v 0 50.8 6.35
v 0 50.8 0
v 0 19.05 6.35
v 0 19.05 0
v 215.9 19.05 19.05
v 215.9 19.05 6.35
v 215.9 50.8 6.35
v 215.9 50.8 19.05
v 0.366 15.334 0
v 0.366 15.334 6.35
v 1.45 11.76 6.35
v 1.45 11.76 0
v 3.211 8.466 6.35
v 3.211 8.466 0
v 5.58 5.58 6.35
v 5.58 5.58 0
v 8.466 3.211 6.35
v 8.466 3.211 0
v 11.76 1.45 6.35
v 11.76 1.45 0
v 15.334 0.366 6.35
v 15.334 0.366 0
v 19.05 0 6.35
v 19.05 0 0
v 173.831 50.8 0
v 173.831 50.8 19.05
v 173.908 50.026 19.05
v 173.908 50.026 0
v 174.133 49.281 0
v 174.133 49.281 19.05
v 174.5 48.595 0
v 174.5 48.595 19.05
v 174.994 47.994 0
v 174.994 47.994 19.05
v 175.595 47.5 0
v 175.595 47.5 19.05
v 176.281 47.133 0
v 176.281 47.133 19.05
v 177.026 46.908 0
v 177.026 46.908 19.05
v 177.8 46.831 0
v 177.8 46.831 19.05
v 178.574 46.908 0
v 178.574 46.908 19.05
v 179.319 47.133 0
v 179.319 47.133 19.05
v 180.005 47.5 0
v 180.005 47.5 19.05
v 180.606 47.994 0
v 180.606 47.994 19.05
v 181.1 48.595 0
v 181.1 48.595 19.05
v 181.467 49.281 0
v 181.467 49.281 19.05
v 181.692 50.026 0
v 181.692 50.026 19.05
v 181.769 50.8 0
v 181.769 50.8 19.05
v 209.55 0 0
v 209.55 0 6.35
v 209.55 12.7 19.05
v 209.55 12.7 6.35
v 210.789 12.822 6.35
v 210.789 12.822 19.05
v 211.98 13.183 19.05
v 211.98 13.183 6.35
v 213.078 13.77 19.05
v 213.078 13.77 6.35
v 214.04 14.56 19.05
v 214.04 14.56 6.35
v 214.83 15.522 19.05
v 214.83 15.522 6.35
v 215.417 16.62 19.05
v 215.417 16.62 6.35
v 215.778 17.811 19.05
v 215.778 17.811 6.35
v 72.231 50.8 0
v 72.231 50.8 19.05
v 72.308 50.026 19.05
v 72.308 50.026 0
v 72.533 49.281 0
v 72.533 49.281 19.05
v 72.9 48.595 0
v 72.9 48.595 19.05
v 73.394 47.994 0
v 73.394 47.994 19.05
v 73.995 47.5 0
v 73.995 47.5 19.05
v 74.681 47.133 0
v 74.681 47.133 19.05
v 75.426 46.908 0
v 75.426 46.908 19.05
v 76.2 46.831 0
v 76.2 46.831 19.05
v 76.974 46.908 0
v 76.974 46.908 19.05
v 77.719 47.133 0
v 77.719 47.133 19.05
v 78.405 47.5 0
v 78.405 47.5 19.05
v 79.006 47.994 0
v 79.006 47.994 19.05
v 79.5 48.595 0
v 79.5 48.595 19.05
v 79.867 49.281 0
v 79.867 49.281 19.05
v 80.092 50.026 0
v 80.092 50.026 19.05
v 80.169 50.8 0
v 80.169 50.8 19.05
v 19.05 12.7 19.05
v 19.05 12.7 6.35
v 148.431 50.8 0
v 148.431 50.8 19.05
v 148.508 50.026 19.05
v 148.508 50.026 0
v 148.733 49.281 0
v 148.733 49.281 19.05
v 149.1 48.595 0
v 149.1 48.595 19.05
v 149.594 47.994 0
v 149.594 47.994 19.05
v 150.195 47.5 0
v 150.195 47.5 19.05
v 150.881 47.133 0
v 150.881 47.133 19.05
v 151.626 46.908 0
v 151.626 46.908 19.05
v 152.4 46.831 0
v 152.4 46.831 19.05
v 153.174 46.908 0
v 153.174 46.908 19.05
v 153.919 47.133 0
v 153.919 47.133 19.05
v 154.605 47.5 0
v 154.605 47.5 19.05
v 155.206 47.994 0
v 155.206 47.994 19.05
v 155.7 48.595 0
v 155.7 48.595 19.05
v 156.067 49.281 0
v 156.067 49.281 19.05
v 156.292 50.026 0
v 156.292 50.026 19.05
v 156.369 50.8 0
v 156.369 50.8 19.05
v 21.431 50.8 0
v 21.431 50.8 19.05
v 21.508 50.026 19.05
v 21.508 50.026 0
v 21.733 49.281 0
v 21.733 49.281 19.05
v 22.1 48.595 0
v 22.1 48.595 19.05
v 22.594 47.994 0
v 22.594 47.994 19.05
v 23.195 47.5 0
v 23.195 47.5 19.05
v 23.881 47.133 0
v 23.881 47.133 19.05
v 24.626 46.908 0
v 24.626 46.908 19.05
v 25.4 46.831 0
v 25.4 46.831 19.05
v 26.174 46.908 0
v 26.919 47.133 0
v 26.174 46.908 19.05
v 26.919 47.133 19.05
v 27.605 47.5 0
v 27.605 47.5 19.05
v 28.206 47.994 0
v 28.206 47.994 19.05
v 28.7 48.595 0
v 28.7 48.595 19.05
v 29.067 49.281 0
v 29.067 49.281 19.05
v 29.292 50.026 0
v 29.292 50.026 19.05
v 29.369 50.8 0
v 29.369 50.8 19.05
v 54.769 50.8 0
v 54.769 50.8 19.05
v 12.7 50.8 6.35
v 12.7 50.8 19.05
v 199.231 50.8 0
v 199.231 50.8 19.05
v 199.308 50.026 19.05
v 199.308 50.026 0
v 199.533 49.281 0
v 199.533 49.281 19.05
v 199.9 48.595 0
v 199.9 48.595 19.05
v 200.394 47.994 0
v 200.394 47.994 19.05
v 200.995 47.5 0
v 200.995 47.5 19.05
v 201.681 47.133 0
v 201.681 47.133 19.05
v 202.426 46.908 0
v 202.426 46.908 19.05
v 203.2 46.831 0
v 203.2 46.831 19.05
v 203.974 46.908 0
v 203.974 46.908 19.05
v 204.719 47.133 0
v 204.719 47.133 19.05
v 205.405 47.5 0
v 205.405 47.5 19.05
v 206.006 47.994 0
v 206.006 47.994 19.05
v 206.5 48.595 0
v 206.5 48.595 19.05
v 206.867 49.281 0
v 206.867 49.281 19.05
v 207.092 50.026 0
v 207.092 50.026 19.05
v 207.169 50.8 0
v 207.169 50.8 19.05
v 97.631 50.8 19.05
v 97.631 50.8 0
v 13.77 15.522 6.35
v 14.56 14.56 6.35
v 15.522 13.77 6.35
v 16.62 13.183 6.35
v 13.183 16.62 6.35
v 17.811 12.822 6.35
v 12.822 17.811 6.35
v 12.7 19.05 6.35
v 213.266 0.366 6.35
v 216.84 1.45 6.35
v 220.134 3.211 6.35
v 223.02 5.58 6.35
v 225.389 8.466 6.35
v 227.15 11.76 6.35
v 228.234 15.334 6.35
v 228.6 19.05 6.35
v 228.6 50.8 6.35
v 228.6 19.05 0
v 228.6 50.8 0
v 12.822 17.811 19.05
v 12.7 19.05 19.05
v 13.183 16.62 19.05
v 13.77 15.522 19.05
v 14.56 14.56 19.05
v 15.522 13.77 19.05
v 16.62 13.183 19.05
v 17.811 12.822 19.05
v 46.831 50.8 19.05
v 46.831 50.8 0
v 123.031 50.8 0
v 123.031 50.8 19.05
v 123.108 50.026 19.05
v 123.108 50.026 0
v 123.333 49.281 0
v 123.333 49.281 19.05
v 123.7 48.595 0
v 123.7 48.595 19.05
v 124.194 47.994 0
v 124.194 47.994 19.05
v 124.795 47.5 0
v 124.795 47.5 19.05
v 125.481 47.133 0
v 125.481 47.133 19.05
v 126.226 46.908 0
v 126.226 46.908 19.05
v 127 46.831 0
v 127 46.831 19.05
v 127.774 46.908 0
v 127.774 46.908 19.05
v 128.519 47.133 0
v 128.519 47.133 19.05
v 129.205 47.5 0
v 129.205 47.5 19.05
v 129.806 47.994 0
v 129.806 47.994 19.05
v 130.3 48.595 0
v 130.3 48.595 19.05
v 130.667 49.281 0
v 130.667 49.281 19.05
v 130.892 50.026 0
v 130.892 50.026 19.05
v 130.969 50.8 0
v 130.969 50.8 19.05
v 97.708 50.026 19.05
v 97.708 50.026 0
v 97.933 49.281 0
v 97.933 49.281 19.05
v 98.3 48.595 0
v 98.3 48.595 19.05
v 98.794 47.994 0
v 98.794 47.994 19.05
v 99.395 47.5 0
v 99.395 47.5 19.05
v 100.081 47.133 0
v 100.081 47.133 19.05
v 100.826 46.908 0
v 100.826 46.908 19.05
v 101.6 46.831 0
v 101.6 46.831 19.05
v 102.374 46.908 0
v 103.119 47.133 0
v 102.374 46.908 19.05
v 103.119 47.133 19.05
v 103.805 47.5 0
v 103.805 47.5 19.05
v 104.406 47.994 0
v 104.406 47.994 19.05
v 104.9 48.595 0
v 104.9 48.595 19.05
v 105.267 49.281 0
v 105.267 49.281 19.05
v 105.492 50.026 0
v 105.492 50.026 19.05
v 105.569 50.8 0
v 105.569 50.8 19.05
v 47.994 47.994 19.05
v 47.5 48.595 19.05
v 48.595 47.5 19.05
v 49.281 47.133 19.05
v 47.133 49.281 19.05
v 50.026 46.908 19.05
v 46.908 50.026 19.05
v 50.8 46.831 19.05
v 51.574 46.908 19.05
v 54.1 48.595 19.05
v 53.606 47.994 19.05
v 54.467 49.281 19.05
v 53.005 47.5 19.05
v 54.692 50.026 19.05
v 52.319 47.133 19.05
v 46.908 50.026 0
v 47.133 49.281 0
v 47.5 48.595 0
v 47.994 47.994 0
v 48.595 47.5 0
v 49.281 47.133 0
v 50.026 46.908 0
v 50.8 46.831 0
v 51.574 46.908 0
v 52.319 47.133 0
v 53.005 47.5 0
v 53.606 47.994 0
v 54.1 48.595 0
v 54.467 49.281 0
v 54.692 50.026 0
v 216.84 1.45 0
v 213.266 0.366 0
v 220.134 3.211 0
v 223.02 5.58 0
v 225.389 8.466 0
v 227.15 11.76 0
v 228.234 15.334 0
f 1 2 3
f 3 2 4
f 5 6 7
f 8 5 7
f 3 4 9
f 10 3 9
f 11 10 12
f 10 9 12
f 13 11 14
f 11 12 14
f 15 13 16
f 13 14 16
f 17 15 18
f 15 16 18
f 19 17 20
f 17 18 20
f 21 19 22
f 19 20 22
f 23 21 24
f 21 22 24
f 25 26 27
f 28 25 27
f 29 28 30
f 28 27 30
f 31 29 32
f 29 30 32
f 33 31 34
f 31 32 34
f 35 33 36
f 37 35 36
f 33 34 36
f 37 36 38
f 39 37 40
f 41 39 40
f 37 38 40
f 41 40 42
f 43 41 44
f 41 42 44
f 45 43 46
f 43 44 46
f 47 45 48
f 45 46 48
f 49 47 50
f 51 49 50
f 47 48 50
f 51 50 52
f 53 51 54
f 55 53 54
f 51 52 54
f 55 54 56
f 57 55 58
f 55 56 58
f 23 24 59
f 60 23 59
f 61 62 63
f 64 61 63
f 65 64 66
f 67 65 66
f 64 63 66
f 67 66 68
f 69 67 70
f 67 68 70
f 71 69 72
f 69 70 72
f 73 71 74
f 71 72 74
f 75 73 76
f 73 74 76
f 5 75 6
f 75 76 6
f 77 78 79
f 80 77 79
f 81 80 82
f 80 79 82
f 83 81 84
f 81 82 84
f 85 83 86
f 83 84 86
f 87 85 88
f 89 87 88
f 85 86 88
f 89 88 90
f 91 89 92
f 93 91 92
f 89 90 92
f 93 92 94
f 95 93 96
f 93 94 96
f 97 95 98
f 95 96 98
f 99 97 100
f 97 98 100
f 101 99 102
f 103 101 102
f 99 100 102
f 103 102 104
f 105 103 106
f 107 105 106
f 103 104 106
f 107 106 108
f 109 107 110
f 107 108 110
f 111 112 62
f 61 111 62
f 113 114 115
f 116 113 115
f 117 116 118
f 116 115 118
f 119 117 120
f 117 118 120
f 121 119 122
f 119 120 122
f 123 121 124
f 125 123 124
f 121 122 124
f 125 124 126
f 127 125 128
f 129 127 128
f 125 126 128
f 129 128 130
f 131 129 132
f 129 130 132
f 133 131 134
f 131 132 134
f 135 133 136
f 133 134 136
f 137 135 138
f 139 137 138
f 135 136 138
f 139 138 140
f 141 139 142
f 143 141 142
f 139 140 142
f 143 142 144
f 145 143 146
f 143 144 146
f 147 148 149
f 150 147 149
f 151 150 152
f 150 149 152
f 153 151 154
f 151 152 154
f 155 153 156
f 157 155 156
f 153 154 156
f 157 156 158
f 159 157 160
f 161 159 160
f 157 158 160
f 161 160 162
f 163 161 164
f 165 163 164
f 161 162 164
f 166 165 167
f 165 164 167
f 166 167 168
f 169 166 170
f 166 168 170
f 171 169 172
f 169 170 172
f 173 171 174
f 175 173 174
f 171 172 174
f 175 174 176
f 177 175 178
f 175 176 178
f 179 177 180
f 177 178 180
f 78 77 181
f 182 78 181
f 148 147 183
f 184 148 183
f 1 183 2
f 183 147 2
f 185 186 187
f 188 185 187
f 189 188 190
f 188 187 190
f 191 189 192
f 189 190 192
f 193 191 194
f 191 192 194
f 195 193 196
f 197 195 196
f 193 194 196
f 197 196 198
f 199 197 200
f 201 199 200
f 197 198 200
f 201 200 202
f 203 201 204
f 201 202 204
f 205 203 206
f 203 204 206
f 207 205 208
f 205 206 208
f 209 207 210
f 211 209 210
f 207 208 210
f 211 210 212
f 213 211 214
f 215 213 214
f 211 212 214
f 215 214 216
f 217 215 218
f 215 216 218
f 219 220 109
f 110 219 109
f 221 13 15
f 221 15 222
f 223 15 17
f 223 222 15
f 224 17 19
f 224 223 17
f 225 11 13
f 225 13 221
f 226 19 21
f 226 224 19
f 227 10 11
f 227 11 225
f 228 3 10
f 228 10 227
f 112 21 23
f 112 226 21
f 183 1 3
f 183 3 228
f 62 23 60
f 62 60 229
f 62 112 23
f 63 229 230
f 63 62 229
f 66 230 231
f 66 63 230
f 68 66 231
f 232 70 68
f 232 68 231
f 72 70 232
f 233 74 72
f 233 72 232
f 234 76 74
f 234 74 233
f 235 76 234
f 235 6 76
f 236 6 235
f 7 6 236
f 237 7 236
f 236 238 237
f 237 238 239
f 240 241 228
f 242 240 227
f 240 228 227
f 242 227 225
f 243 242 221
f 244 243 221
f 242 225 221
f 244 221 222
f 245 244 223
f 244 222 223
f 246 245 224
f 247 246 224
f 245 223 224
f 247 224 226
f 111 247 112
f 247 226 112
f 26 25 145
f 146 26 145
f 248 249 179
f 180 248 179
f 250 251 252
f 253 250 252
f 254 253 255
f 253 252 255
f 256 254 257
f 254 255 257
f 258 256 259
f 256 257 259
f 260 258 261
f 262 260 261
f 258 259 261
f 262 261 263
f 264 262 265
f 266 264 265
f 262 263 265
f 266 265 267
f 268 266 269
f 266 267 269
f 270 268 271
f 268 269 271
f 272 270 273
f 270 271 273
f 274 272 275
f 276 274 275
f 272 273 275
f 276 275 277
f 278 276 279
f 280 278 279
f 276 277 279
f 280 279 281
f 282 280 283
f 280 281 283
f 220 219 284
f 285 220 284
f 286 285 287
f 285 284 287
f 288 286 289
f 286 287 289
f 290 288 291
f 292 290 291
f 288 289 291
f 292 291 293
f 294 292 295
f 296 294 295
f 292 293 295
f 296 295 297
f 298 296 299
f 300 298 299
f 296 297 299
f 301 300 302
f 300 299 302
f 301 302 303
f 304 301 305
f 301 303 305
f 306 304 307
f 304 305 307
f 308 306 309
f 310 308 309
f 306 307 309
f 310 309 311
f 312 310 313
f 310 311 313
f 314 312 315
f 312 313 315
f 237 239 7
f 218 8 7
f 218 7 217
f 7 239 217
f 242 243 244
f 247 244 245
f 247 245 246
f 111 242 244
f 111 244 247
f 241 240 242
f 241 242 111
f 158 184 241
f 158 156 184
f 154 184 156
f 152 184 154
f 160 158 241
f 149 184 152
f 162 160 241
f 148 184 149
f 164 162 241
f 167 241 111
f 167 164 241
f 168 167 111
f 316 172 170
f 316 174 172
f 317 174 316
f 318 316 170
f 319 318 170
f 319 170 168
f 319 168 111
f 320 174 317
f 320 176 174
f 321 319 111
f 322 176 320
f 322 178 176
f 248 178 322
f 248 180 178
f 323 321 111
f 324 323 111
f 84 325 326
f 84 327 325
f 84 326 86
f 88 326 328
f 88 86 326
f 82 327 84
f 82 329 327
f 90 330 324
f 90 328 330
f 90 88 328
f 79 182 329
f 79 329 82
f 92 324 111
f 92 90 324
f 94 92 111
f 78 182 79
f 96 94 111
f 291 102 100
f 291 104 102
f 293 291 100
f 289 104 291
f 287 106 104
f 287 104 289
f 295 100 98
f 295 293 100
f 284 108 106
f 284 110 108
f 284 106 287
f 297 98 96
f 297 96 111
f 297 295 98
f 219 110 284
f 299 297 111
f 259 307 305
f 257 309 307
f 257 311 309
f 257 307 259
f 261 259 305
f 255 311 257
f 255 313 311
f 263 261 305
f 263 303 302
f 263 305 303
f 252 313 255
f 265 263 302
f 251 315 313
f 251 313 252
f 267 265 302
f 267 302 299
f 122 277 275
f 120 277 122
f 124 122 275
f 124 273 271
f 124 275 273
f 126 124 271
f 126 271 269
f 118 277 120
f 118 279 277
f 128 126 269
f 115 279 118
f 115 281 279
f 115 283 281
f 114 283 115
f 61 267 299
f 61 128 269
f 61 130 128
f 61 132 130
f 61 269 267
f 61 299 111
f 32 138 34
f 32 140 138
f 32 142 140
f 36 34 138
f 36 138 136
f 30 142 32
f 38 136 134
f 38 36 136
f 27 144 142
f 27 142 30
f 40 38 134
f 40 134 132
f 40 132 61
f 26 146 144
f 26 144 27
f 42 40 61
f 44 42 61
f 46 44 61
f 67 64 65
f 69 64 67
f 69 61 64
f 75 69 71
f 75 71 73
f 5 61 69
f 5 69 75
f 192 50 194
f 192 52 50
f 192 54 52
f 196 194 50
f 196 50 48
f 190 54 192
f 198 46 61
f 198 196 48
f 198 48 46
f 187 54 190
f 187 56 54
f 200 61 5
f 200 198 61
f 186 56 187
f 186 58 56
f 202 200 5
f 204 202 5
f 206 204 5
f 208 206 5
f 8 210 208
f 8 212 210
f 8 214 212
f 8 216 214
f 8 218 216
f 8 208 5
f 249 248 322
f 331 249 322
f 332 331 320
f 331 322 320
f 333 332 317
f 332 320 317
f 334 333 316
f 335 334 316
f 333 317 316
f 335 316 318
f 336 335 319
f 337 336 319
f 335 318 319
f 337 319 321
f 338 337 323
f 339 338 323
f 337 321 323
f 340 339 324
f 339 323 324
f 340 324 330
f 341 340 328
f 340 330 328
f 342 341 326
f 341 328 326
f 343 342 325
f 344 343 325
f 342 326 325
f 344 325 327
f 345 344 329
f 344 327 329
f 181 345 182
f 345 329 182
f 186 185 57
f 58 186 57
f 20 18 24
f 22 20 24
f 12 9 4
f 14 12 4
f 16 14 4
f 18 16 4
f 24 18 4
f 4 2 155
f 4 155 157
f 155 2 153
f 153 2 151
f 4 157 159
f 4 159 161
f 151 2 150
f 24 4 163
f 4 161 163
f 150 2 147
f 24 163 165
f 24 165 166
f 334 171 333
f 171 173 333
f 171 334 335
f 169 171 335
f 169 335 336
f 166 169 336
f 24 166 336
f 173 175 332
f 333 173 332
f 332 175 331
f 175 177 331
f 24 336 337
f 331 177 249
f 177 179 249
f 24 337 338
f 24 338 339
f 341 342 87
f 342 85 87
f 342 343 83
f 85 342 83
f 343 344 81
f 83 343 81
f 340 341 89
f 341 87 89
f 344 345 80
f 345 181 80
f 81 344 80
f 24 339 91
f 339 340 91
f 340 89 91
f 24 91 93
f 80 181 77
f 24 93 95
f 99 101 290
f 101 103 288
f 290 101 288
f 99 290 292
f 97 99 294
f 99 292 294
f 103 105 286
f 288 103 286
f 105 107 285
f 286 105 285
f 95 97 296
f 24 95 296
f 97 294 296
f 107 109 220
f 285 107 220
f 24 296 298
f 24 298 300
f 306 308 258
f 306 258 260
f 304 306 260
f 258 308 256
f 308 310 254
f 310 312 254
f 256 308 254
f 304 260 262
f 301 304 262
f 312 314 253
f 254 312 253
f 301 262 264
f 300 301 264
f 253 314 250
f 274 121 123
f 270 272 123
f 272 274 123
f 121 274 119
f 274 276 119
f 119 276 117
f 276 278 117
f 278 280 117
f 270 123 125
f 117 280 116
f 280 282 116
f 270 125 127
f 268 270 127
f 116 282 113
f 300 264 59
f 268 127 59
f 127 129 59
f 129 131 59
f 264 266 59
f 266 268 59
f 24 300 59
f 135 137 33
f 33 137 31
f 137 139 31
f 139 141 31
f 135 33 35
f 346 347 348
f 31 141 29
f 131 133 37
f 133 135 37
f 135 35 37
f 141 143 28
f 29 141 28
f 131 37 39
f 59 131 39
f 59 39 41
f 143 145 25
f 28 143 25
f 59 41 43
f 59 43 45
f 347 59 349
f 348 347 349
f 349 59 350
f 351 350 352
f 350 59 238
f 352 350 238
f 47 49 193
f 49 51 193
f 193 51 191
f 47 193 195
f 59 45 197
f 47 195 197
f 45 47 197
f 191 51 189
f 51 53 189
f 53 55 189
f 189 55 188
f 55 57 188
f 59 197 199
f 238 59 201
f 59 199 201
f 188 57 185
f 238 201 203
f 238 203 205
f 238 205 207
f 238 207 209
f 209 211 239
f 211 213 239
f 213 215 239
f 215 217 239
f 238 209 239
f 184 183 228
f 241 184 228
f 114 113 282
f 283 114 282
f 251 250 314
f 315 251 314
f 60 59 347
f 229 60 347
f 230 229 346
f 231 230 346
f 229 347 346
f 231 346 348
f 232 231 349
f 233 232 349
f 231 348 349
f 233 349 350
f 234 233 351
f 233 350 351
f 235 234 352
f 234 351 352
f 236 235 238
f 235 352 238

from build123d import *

# Parameters (mm, degrees)
F1_DEPTH = 6.35
F3_DEPTH = 12.7
F5_DEPTH = 25.4


with BuildPart() as f1:
    # F0 (on Top) → F1 (new body)
    with BuildSketch(Plane.XY):
        with BuildLine():
            ThreePointArc((0, 19.05), (5.579616, 5.579616), (19.05, 0))
            Line((19.05, 0), (209.55, 0))
            ThreePointArc((209.55, 0), (223.020384, 5.579616), (228.6, 19.05))
            Line((228.6, 19.05), (228.6, 50.8))
            Line((228.6, 50.8), (0, 50.8))
            Line((0, 50.8), (0, 19.05))
        make_face()
    extrude(amount=F1_DEPTH)

    # F2 (on face) → F3 (join)
    with BuildSketch(Plane.XY.offset(6.35)):
        with BuildLine():
            Line((12.7, 50.8), (12.7, 19.05))
            ThreePointArc((12.7, 19.05), (14.559872, 14.559872), (19.05, 12.7))
            Line((19.05, 12.7), (209.55, 12.7))
            ThreePointArc((209.55, 12.7), (214.040128, 14.559872), (215.9, 19.05))
            Line((215.9, 19.05), (215.9, 50.8))
            Line((215.9, 50.8), (12.7, 50.8))
        make_face()
    extrude(amount=F3_DEPTH)

    # F4 (on face) → F5 (cut)
    with BuildSketch(Plane.XY.offset(19.05)):
        with BuildLine():
            ThreePointArc((29.36875, 50.8), (25.4, 54.76875), (21.43125, 50.8))
            Line((21.43125, 50.8), (29.36875, 50.8))
        make_face()
        with BuildLine():
            Line((29.36875, 50.8), (21.43125, 50.8))
            ThreePointArc((21.43125, 50.8), (25.4, 46.83125), (29.36875, 50.8))
        make_face()
        with BuildLine():
            ThreePointArc((54.76875, 50.8), (50.8, 54.76875), (46.83125, 50.8))
            Line((46.83125, 50.8), (54.76875, 50.8))
        make_face()
        with BuildLine():
            Line((54.76875, 50.8), (46.83125, 50.8))
            ThreePointArc((46.83125, 50.8), (50.8, 46.83125), (54.76875, 50.8))
        make_face()
        with BuildLine():
            ThreePointArc((72.23125, 50.8), (76.2, 46.83125), (80.16875, 50.8))
            Line((80.16875, 50.8), (72.23125, 50.8))
        make_face()
        with BuildLine():
            ThreePointArc((199.23125, 50.8), (203.2, 46.83125), (207.16875, 50.8))
            Line((207.16875, 50.8), (199.23125, 50.8))
        make_face()
        with BuildLine():
            ThreePointArc((173.83125, 50.8), (177.8, 46.83125), (181.76875, 50.8))
            Line((181.76875, 50.8), (173.83125, 50.8))
        make_face()
        with BuildLine():
            ThreePointArc((148.43125, 50.8), (152.4, 46.83125), (156.36875, 50.8))
            Line((156.36875, 50.8), (148.43125, 50.8))
        make_face()
        with BuildLine():
            ThreePointArc((123.03125, 50.8), (127, 46.83125), (130.96875, 50.8))
            Line((130.96875, 50.8), (123.03125, 50.8))
        make_face()
        with BuildLine():
            Line((97.63125, 50.8), (105.56875, 50.8))
            ThreePointArc((105.56875, 50.8), (101.6, 54.76875), (97.63125, 50.8))
        make_face()
        with BuildLine():
            Line((72.23125, 50.8), (80.16875, 50.8))
            ThreePointArc((80.16875, 50.8), (76.2, 54.76875), (72.23125, 50.8))
        make_face()
        with BuildLine():
            Line((199.23125, 50.8), (207.16875, 50.8))
            ThreePointArc((207.16875, 50.8), (203.2, 54.76875), (199.23125, 50.8))
        make_face()
        with BuildLine():
            Line((173.83125, 50.8), (181.76875, 50.8))
            ThreePointArc((181.76875, 50.8), (177.8, 54.76875), (173.83125, 50.8))
        make_face()
        with BuildLine():
            Line((148.43125, 50.8), (156.36875, 50.8))
            ThreePointArc((156.36875, 50.8), (152.4, 54.76875), (148.43125, 50.8))
        make_face()
        with BuildLine():
            Line((123.03125, 50.8), (130.96875, 50.8))
            ThreePointArc((130.96875, 50.8), (127, 54.76875), (123.03125, 50.8))
        make_face()
        with BuildLine():
            ThreePointArc((97.63125, 50.8), (101.6, 46.83125), (105.56875, 50.8))
            Line((105.56875, 50.8), (97.63125, 50.8))
        make_face()
    extrude(amount=-F5_DEPTH, mode=Mode.SUBTRACT)


solid = f1.part
